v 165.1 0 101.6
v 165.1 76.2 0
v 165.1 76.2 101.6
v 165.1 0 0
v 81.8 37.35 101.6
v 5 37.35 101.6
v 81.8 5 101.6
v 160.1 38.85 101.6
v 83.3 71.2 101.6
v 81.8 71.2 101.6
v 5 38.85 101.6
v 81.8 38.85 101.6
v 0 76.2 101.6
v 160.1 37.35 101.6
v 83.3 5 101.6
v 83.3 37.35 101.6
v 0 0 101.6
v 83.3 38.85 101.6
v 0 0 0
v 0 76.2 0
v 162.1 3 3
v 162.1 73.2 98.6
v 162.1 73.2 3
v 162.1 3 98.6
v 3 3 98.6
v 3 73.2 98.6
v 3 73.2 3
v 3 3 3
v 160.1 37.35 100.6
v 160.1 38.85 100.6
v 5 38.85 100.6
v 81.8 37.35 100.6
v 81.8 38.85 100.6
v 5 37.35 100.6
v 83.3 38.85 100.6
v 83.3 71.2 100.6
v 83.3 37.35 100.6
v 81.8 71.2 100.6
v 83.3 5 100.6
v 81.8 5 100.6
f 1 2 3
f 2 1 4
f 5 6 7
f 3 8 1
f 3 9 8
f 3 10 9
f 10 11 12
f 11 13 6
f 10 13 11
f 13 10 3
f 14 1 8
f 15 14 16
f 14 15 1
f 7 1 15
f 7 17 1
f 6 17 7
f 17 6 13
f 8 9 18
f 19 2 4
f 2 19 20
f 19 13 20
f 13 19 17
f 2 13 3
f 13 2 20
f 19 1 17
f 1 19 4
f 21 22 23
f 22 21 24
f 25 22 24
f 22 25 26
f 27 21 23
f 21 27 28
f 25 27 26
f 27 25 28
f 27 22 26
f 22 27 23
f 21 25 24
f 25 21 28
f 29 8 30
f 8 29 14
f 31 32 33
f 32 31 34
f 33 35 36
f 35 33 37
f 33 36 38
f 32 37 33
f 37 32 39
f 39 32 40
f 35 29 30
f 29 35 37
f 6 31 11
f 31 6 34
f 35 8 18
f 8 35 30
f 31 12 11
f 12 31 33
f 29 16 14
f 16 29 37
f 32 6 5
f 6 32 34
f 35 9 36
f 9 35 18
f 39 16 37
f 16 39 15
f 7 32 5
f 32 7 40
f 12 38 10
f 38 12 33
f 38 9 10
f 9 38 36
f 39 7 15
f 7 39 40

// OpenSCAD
$fn = 120;

// ============================================================
// HELIOS — Load Cell Mounting Stand
// Material: Polycarbonate (PC) — straight, dry filament only
// Printer:  Bambu H2D, enclosed
// Date:     2026-05-11
// Rev:      V1
// ============================================================
// PURPOSE
//   Rigid pedestal that lifts the single-point bar load cell to
//   the correct Z so the live-end button receives the weighing
//   plate / scale-pan adapter from the upper chamber posts.
//
//   Per Andrew, 2026-05-11:
//     Overall:  6.5" L  ×  3" W  ×  4" H
//                165.1  ×  76.2 ×  101.6 mm
//     Structure: closed tube / hollow box — firm base, strong
//                walls, firm top.  Slicer-infill the interior
//                (gyroid 25–30%) or print with supports.
//     Alignment: shallow crosshair indent on the top face,
//                centered longitude AND latitude, for placing
//                the L-bracket dead-center.
// ============================================================
// PRINT SETTINGS (Bambu H2D + PC)
//   Nozzle 270 °C   |   Bed 100 °C   |   Chamber heater ON
//   Outer wall 30 mm/s, inner 50 mm/s, first layer 25 mm/s
//   Fan 0% layers 1–3, then 10–20%
//   Walls: 4   |   Top/Bottom: 5 layers
//   Infill: GYROID 25–30%  (this is the "lattice" — slicer fills the cavity)
//   Brim: 5 mm   |   Z-hop 0.4 mm
//   Filament must be DRY (PC absorbs moisture fast)
//
//   Orientation: print STANDING (101.6 mm tall as Z).  Top face
//   is a 165 × 76 mm bridge, but at 30% gyroid the infill carries
//   the top layers without supports.  If you'd rather, print on
//   its side (76 mm tall) and skip infill entirely — the crosshair
//   then prints as a vertical feature, which is fine on H2D.
// ============================================================

// === OUTER ENVELOPE (from Andrew) ===
stand_l        = 165.1;     // 6.5"
stand_w        = 76.2;      // 3.0"
stand_h        = 101.6;     // 4.0"

// === SHELL THICKNESS ===
// 1.5 kg load on a 165x76 mm footprint uses 0.014% of PC's compressive
// strength — 3 mm walls are massive overkill structurally but feel firm
// in the hand and print fast.  Drop wall_t to 2.0 if you want it even faster.
wall_t         = 3.0;       // side walls
top_t          = 3.0;       // top face (firm — load cell bracket bolts/sits here)
base_t         = 3.0;       // bottom face (firm — sits on lower bay floor)

// === ALIGNMENT CROSSHAIR ON TOP ===
cross_depth    = 1.0;       // shallow indent
cross_width    = 1.5;       // line width
cross_run_l    = stand_l - 10;   // longitudinal line (X): leaves 5mm margin each end
cross_run_w    = stand_w - 10;   // latitudinal line (Y):  leaves 5mm margin each side

// === OPTIONAL FLOOR-MOUNT THROUGH-HOLES ===
// Set true if you want bolt-down holes in the BASE only.
// (Top stays solid so the L-bracket gets a clean firm surface.)
use_floor_holes = false;
floor_hole_d    = 5.2;      // M5 clearance
floor_hole_inset = 12.0;    // from corner

// ============================================================
// MATH / VERIFICATION
// ============================================================
echo("");
echo("=========================================");
echo("HELIOS LOAD CELL STAND — V1");
echo("=========================================");
echo("Envelope (mm) :", stand_l, " x ", stand_w, " x ", stand_h);
echo("Envelope (in) :", stand_l/25.4, " x ", stand_w/25.4, " x ", stand_h/25.4);
echo("Wall t        :", wall_t, " mm");
echo("Top/Base t    :", top_t, " /", base_t, " mm");
echo("Internal cavity :", stand_l - 2*wall_t, " x ", stand_w - 2*wall_t, " x ", stand_h - top_t - base_t);
echo("Crosshair: 1mm deep, 1.5mm wide, runs through center");
echo("=========================================");
echo("");

// ============================================================
// MODULE
// ============================================================
module load_cell_stand() {
    difference() {
        // ── solid outer envelope
        cube([stand_l, stand_w, stand_h]);

        // ── internal cavity (the "tube" — closed top, base, and walls)
        translate([wall_t, wall_t, base_t])
            cube([stand_l - 2*wall_t,
                  stand_w - 2*wall_t,
                  stand_h - top_t - base_t]);

        // ── alignment crosshair on the TOP face
        //    longitudinal line (along X)
        translate([(stand_l - cross_run_l)/2,
                   (stand_w - cross_width)/2,
                   stand_h - cross_depth])
            cube([cross_run_l, cross_width, cross_depth + 0.5]);

        //    latitudinal line (along Y)
        translate([(stand_l - cross_width)/2,
                   (stand_w - cross_run_w)/2,
                   stand_h - cross_depth])
            cube([cross_width, cross_run_w, cross_depth + 0.5]);

        // ── optional floor through-holes
        if (use_floor_holes) {
            for (xf = [floor_hole_inset, stand_l - floor_hole_inset]) {
                for (yf = [floor_hole_inset, stand_w - floor_hole_inset]) {
                    translate([xf, yf, -0.5])
                        cylinder(d=floor_hole_d, h=base_t + 1);
                }
            }
        }
    }
}

load_cell_stand();
